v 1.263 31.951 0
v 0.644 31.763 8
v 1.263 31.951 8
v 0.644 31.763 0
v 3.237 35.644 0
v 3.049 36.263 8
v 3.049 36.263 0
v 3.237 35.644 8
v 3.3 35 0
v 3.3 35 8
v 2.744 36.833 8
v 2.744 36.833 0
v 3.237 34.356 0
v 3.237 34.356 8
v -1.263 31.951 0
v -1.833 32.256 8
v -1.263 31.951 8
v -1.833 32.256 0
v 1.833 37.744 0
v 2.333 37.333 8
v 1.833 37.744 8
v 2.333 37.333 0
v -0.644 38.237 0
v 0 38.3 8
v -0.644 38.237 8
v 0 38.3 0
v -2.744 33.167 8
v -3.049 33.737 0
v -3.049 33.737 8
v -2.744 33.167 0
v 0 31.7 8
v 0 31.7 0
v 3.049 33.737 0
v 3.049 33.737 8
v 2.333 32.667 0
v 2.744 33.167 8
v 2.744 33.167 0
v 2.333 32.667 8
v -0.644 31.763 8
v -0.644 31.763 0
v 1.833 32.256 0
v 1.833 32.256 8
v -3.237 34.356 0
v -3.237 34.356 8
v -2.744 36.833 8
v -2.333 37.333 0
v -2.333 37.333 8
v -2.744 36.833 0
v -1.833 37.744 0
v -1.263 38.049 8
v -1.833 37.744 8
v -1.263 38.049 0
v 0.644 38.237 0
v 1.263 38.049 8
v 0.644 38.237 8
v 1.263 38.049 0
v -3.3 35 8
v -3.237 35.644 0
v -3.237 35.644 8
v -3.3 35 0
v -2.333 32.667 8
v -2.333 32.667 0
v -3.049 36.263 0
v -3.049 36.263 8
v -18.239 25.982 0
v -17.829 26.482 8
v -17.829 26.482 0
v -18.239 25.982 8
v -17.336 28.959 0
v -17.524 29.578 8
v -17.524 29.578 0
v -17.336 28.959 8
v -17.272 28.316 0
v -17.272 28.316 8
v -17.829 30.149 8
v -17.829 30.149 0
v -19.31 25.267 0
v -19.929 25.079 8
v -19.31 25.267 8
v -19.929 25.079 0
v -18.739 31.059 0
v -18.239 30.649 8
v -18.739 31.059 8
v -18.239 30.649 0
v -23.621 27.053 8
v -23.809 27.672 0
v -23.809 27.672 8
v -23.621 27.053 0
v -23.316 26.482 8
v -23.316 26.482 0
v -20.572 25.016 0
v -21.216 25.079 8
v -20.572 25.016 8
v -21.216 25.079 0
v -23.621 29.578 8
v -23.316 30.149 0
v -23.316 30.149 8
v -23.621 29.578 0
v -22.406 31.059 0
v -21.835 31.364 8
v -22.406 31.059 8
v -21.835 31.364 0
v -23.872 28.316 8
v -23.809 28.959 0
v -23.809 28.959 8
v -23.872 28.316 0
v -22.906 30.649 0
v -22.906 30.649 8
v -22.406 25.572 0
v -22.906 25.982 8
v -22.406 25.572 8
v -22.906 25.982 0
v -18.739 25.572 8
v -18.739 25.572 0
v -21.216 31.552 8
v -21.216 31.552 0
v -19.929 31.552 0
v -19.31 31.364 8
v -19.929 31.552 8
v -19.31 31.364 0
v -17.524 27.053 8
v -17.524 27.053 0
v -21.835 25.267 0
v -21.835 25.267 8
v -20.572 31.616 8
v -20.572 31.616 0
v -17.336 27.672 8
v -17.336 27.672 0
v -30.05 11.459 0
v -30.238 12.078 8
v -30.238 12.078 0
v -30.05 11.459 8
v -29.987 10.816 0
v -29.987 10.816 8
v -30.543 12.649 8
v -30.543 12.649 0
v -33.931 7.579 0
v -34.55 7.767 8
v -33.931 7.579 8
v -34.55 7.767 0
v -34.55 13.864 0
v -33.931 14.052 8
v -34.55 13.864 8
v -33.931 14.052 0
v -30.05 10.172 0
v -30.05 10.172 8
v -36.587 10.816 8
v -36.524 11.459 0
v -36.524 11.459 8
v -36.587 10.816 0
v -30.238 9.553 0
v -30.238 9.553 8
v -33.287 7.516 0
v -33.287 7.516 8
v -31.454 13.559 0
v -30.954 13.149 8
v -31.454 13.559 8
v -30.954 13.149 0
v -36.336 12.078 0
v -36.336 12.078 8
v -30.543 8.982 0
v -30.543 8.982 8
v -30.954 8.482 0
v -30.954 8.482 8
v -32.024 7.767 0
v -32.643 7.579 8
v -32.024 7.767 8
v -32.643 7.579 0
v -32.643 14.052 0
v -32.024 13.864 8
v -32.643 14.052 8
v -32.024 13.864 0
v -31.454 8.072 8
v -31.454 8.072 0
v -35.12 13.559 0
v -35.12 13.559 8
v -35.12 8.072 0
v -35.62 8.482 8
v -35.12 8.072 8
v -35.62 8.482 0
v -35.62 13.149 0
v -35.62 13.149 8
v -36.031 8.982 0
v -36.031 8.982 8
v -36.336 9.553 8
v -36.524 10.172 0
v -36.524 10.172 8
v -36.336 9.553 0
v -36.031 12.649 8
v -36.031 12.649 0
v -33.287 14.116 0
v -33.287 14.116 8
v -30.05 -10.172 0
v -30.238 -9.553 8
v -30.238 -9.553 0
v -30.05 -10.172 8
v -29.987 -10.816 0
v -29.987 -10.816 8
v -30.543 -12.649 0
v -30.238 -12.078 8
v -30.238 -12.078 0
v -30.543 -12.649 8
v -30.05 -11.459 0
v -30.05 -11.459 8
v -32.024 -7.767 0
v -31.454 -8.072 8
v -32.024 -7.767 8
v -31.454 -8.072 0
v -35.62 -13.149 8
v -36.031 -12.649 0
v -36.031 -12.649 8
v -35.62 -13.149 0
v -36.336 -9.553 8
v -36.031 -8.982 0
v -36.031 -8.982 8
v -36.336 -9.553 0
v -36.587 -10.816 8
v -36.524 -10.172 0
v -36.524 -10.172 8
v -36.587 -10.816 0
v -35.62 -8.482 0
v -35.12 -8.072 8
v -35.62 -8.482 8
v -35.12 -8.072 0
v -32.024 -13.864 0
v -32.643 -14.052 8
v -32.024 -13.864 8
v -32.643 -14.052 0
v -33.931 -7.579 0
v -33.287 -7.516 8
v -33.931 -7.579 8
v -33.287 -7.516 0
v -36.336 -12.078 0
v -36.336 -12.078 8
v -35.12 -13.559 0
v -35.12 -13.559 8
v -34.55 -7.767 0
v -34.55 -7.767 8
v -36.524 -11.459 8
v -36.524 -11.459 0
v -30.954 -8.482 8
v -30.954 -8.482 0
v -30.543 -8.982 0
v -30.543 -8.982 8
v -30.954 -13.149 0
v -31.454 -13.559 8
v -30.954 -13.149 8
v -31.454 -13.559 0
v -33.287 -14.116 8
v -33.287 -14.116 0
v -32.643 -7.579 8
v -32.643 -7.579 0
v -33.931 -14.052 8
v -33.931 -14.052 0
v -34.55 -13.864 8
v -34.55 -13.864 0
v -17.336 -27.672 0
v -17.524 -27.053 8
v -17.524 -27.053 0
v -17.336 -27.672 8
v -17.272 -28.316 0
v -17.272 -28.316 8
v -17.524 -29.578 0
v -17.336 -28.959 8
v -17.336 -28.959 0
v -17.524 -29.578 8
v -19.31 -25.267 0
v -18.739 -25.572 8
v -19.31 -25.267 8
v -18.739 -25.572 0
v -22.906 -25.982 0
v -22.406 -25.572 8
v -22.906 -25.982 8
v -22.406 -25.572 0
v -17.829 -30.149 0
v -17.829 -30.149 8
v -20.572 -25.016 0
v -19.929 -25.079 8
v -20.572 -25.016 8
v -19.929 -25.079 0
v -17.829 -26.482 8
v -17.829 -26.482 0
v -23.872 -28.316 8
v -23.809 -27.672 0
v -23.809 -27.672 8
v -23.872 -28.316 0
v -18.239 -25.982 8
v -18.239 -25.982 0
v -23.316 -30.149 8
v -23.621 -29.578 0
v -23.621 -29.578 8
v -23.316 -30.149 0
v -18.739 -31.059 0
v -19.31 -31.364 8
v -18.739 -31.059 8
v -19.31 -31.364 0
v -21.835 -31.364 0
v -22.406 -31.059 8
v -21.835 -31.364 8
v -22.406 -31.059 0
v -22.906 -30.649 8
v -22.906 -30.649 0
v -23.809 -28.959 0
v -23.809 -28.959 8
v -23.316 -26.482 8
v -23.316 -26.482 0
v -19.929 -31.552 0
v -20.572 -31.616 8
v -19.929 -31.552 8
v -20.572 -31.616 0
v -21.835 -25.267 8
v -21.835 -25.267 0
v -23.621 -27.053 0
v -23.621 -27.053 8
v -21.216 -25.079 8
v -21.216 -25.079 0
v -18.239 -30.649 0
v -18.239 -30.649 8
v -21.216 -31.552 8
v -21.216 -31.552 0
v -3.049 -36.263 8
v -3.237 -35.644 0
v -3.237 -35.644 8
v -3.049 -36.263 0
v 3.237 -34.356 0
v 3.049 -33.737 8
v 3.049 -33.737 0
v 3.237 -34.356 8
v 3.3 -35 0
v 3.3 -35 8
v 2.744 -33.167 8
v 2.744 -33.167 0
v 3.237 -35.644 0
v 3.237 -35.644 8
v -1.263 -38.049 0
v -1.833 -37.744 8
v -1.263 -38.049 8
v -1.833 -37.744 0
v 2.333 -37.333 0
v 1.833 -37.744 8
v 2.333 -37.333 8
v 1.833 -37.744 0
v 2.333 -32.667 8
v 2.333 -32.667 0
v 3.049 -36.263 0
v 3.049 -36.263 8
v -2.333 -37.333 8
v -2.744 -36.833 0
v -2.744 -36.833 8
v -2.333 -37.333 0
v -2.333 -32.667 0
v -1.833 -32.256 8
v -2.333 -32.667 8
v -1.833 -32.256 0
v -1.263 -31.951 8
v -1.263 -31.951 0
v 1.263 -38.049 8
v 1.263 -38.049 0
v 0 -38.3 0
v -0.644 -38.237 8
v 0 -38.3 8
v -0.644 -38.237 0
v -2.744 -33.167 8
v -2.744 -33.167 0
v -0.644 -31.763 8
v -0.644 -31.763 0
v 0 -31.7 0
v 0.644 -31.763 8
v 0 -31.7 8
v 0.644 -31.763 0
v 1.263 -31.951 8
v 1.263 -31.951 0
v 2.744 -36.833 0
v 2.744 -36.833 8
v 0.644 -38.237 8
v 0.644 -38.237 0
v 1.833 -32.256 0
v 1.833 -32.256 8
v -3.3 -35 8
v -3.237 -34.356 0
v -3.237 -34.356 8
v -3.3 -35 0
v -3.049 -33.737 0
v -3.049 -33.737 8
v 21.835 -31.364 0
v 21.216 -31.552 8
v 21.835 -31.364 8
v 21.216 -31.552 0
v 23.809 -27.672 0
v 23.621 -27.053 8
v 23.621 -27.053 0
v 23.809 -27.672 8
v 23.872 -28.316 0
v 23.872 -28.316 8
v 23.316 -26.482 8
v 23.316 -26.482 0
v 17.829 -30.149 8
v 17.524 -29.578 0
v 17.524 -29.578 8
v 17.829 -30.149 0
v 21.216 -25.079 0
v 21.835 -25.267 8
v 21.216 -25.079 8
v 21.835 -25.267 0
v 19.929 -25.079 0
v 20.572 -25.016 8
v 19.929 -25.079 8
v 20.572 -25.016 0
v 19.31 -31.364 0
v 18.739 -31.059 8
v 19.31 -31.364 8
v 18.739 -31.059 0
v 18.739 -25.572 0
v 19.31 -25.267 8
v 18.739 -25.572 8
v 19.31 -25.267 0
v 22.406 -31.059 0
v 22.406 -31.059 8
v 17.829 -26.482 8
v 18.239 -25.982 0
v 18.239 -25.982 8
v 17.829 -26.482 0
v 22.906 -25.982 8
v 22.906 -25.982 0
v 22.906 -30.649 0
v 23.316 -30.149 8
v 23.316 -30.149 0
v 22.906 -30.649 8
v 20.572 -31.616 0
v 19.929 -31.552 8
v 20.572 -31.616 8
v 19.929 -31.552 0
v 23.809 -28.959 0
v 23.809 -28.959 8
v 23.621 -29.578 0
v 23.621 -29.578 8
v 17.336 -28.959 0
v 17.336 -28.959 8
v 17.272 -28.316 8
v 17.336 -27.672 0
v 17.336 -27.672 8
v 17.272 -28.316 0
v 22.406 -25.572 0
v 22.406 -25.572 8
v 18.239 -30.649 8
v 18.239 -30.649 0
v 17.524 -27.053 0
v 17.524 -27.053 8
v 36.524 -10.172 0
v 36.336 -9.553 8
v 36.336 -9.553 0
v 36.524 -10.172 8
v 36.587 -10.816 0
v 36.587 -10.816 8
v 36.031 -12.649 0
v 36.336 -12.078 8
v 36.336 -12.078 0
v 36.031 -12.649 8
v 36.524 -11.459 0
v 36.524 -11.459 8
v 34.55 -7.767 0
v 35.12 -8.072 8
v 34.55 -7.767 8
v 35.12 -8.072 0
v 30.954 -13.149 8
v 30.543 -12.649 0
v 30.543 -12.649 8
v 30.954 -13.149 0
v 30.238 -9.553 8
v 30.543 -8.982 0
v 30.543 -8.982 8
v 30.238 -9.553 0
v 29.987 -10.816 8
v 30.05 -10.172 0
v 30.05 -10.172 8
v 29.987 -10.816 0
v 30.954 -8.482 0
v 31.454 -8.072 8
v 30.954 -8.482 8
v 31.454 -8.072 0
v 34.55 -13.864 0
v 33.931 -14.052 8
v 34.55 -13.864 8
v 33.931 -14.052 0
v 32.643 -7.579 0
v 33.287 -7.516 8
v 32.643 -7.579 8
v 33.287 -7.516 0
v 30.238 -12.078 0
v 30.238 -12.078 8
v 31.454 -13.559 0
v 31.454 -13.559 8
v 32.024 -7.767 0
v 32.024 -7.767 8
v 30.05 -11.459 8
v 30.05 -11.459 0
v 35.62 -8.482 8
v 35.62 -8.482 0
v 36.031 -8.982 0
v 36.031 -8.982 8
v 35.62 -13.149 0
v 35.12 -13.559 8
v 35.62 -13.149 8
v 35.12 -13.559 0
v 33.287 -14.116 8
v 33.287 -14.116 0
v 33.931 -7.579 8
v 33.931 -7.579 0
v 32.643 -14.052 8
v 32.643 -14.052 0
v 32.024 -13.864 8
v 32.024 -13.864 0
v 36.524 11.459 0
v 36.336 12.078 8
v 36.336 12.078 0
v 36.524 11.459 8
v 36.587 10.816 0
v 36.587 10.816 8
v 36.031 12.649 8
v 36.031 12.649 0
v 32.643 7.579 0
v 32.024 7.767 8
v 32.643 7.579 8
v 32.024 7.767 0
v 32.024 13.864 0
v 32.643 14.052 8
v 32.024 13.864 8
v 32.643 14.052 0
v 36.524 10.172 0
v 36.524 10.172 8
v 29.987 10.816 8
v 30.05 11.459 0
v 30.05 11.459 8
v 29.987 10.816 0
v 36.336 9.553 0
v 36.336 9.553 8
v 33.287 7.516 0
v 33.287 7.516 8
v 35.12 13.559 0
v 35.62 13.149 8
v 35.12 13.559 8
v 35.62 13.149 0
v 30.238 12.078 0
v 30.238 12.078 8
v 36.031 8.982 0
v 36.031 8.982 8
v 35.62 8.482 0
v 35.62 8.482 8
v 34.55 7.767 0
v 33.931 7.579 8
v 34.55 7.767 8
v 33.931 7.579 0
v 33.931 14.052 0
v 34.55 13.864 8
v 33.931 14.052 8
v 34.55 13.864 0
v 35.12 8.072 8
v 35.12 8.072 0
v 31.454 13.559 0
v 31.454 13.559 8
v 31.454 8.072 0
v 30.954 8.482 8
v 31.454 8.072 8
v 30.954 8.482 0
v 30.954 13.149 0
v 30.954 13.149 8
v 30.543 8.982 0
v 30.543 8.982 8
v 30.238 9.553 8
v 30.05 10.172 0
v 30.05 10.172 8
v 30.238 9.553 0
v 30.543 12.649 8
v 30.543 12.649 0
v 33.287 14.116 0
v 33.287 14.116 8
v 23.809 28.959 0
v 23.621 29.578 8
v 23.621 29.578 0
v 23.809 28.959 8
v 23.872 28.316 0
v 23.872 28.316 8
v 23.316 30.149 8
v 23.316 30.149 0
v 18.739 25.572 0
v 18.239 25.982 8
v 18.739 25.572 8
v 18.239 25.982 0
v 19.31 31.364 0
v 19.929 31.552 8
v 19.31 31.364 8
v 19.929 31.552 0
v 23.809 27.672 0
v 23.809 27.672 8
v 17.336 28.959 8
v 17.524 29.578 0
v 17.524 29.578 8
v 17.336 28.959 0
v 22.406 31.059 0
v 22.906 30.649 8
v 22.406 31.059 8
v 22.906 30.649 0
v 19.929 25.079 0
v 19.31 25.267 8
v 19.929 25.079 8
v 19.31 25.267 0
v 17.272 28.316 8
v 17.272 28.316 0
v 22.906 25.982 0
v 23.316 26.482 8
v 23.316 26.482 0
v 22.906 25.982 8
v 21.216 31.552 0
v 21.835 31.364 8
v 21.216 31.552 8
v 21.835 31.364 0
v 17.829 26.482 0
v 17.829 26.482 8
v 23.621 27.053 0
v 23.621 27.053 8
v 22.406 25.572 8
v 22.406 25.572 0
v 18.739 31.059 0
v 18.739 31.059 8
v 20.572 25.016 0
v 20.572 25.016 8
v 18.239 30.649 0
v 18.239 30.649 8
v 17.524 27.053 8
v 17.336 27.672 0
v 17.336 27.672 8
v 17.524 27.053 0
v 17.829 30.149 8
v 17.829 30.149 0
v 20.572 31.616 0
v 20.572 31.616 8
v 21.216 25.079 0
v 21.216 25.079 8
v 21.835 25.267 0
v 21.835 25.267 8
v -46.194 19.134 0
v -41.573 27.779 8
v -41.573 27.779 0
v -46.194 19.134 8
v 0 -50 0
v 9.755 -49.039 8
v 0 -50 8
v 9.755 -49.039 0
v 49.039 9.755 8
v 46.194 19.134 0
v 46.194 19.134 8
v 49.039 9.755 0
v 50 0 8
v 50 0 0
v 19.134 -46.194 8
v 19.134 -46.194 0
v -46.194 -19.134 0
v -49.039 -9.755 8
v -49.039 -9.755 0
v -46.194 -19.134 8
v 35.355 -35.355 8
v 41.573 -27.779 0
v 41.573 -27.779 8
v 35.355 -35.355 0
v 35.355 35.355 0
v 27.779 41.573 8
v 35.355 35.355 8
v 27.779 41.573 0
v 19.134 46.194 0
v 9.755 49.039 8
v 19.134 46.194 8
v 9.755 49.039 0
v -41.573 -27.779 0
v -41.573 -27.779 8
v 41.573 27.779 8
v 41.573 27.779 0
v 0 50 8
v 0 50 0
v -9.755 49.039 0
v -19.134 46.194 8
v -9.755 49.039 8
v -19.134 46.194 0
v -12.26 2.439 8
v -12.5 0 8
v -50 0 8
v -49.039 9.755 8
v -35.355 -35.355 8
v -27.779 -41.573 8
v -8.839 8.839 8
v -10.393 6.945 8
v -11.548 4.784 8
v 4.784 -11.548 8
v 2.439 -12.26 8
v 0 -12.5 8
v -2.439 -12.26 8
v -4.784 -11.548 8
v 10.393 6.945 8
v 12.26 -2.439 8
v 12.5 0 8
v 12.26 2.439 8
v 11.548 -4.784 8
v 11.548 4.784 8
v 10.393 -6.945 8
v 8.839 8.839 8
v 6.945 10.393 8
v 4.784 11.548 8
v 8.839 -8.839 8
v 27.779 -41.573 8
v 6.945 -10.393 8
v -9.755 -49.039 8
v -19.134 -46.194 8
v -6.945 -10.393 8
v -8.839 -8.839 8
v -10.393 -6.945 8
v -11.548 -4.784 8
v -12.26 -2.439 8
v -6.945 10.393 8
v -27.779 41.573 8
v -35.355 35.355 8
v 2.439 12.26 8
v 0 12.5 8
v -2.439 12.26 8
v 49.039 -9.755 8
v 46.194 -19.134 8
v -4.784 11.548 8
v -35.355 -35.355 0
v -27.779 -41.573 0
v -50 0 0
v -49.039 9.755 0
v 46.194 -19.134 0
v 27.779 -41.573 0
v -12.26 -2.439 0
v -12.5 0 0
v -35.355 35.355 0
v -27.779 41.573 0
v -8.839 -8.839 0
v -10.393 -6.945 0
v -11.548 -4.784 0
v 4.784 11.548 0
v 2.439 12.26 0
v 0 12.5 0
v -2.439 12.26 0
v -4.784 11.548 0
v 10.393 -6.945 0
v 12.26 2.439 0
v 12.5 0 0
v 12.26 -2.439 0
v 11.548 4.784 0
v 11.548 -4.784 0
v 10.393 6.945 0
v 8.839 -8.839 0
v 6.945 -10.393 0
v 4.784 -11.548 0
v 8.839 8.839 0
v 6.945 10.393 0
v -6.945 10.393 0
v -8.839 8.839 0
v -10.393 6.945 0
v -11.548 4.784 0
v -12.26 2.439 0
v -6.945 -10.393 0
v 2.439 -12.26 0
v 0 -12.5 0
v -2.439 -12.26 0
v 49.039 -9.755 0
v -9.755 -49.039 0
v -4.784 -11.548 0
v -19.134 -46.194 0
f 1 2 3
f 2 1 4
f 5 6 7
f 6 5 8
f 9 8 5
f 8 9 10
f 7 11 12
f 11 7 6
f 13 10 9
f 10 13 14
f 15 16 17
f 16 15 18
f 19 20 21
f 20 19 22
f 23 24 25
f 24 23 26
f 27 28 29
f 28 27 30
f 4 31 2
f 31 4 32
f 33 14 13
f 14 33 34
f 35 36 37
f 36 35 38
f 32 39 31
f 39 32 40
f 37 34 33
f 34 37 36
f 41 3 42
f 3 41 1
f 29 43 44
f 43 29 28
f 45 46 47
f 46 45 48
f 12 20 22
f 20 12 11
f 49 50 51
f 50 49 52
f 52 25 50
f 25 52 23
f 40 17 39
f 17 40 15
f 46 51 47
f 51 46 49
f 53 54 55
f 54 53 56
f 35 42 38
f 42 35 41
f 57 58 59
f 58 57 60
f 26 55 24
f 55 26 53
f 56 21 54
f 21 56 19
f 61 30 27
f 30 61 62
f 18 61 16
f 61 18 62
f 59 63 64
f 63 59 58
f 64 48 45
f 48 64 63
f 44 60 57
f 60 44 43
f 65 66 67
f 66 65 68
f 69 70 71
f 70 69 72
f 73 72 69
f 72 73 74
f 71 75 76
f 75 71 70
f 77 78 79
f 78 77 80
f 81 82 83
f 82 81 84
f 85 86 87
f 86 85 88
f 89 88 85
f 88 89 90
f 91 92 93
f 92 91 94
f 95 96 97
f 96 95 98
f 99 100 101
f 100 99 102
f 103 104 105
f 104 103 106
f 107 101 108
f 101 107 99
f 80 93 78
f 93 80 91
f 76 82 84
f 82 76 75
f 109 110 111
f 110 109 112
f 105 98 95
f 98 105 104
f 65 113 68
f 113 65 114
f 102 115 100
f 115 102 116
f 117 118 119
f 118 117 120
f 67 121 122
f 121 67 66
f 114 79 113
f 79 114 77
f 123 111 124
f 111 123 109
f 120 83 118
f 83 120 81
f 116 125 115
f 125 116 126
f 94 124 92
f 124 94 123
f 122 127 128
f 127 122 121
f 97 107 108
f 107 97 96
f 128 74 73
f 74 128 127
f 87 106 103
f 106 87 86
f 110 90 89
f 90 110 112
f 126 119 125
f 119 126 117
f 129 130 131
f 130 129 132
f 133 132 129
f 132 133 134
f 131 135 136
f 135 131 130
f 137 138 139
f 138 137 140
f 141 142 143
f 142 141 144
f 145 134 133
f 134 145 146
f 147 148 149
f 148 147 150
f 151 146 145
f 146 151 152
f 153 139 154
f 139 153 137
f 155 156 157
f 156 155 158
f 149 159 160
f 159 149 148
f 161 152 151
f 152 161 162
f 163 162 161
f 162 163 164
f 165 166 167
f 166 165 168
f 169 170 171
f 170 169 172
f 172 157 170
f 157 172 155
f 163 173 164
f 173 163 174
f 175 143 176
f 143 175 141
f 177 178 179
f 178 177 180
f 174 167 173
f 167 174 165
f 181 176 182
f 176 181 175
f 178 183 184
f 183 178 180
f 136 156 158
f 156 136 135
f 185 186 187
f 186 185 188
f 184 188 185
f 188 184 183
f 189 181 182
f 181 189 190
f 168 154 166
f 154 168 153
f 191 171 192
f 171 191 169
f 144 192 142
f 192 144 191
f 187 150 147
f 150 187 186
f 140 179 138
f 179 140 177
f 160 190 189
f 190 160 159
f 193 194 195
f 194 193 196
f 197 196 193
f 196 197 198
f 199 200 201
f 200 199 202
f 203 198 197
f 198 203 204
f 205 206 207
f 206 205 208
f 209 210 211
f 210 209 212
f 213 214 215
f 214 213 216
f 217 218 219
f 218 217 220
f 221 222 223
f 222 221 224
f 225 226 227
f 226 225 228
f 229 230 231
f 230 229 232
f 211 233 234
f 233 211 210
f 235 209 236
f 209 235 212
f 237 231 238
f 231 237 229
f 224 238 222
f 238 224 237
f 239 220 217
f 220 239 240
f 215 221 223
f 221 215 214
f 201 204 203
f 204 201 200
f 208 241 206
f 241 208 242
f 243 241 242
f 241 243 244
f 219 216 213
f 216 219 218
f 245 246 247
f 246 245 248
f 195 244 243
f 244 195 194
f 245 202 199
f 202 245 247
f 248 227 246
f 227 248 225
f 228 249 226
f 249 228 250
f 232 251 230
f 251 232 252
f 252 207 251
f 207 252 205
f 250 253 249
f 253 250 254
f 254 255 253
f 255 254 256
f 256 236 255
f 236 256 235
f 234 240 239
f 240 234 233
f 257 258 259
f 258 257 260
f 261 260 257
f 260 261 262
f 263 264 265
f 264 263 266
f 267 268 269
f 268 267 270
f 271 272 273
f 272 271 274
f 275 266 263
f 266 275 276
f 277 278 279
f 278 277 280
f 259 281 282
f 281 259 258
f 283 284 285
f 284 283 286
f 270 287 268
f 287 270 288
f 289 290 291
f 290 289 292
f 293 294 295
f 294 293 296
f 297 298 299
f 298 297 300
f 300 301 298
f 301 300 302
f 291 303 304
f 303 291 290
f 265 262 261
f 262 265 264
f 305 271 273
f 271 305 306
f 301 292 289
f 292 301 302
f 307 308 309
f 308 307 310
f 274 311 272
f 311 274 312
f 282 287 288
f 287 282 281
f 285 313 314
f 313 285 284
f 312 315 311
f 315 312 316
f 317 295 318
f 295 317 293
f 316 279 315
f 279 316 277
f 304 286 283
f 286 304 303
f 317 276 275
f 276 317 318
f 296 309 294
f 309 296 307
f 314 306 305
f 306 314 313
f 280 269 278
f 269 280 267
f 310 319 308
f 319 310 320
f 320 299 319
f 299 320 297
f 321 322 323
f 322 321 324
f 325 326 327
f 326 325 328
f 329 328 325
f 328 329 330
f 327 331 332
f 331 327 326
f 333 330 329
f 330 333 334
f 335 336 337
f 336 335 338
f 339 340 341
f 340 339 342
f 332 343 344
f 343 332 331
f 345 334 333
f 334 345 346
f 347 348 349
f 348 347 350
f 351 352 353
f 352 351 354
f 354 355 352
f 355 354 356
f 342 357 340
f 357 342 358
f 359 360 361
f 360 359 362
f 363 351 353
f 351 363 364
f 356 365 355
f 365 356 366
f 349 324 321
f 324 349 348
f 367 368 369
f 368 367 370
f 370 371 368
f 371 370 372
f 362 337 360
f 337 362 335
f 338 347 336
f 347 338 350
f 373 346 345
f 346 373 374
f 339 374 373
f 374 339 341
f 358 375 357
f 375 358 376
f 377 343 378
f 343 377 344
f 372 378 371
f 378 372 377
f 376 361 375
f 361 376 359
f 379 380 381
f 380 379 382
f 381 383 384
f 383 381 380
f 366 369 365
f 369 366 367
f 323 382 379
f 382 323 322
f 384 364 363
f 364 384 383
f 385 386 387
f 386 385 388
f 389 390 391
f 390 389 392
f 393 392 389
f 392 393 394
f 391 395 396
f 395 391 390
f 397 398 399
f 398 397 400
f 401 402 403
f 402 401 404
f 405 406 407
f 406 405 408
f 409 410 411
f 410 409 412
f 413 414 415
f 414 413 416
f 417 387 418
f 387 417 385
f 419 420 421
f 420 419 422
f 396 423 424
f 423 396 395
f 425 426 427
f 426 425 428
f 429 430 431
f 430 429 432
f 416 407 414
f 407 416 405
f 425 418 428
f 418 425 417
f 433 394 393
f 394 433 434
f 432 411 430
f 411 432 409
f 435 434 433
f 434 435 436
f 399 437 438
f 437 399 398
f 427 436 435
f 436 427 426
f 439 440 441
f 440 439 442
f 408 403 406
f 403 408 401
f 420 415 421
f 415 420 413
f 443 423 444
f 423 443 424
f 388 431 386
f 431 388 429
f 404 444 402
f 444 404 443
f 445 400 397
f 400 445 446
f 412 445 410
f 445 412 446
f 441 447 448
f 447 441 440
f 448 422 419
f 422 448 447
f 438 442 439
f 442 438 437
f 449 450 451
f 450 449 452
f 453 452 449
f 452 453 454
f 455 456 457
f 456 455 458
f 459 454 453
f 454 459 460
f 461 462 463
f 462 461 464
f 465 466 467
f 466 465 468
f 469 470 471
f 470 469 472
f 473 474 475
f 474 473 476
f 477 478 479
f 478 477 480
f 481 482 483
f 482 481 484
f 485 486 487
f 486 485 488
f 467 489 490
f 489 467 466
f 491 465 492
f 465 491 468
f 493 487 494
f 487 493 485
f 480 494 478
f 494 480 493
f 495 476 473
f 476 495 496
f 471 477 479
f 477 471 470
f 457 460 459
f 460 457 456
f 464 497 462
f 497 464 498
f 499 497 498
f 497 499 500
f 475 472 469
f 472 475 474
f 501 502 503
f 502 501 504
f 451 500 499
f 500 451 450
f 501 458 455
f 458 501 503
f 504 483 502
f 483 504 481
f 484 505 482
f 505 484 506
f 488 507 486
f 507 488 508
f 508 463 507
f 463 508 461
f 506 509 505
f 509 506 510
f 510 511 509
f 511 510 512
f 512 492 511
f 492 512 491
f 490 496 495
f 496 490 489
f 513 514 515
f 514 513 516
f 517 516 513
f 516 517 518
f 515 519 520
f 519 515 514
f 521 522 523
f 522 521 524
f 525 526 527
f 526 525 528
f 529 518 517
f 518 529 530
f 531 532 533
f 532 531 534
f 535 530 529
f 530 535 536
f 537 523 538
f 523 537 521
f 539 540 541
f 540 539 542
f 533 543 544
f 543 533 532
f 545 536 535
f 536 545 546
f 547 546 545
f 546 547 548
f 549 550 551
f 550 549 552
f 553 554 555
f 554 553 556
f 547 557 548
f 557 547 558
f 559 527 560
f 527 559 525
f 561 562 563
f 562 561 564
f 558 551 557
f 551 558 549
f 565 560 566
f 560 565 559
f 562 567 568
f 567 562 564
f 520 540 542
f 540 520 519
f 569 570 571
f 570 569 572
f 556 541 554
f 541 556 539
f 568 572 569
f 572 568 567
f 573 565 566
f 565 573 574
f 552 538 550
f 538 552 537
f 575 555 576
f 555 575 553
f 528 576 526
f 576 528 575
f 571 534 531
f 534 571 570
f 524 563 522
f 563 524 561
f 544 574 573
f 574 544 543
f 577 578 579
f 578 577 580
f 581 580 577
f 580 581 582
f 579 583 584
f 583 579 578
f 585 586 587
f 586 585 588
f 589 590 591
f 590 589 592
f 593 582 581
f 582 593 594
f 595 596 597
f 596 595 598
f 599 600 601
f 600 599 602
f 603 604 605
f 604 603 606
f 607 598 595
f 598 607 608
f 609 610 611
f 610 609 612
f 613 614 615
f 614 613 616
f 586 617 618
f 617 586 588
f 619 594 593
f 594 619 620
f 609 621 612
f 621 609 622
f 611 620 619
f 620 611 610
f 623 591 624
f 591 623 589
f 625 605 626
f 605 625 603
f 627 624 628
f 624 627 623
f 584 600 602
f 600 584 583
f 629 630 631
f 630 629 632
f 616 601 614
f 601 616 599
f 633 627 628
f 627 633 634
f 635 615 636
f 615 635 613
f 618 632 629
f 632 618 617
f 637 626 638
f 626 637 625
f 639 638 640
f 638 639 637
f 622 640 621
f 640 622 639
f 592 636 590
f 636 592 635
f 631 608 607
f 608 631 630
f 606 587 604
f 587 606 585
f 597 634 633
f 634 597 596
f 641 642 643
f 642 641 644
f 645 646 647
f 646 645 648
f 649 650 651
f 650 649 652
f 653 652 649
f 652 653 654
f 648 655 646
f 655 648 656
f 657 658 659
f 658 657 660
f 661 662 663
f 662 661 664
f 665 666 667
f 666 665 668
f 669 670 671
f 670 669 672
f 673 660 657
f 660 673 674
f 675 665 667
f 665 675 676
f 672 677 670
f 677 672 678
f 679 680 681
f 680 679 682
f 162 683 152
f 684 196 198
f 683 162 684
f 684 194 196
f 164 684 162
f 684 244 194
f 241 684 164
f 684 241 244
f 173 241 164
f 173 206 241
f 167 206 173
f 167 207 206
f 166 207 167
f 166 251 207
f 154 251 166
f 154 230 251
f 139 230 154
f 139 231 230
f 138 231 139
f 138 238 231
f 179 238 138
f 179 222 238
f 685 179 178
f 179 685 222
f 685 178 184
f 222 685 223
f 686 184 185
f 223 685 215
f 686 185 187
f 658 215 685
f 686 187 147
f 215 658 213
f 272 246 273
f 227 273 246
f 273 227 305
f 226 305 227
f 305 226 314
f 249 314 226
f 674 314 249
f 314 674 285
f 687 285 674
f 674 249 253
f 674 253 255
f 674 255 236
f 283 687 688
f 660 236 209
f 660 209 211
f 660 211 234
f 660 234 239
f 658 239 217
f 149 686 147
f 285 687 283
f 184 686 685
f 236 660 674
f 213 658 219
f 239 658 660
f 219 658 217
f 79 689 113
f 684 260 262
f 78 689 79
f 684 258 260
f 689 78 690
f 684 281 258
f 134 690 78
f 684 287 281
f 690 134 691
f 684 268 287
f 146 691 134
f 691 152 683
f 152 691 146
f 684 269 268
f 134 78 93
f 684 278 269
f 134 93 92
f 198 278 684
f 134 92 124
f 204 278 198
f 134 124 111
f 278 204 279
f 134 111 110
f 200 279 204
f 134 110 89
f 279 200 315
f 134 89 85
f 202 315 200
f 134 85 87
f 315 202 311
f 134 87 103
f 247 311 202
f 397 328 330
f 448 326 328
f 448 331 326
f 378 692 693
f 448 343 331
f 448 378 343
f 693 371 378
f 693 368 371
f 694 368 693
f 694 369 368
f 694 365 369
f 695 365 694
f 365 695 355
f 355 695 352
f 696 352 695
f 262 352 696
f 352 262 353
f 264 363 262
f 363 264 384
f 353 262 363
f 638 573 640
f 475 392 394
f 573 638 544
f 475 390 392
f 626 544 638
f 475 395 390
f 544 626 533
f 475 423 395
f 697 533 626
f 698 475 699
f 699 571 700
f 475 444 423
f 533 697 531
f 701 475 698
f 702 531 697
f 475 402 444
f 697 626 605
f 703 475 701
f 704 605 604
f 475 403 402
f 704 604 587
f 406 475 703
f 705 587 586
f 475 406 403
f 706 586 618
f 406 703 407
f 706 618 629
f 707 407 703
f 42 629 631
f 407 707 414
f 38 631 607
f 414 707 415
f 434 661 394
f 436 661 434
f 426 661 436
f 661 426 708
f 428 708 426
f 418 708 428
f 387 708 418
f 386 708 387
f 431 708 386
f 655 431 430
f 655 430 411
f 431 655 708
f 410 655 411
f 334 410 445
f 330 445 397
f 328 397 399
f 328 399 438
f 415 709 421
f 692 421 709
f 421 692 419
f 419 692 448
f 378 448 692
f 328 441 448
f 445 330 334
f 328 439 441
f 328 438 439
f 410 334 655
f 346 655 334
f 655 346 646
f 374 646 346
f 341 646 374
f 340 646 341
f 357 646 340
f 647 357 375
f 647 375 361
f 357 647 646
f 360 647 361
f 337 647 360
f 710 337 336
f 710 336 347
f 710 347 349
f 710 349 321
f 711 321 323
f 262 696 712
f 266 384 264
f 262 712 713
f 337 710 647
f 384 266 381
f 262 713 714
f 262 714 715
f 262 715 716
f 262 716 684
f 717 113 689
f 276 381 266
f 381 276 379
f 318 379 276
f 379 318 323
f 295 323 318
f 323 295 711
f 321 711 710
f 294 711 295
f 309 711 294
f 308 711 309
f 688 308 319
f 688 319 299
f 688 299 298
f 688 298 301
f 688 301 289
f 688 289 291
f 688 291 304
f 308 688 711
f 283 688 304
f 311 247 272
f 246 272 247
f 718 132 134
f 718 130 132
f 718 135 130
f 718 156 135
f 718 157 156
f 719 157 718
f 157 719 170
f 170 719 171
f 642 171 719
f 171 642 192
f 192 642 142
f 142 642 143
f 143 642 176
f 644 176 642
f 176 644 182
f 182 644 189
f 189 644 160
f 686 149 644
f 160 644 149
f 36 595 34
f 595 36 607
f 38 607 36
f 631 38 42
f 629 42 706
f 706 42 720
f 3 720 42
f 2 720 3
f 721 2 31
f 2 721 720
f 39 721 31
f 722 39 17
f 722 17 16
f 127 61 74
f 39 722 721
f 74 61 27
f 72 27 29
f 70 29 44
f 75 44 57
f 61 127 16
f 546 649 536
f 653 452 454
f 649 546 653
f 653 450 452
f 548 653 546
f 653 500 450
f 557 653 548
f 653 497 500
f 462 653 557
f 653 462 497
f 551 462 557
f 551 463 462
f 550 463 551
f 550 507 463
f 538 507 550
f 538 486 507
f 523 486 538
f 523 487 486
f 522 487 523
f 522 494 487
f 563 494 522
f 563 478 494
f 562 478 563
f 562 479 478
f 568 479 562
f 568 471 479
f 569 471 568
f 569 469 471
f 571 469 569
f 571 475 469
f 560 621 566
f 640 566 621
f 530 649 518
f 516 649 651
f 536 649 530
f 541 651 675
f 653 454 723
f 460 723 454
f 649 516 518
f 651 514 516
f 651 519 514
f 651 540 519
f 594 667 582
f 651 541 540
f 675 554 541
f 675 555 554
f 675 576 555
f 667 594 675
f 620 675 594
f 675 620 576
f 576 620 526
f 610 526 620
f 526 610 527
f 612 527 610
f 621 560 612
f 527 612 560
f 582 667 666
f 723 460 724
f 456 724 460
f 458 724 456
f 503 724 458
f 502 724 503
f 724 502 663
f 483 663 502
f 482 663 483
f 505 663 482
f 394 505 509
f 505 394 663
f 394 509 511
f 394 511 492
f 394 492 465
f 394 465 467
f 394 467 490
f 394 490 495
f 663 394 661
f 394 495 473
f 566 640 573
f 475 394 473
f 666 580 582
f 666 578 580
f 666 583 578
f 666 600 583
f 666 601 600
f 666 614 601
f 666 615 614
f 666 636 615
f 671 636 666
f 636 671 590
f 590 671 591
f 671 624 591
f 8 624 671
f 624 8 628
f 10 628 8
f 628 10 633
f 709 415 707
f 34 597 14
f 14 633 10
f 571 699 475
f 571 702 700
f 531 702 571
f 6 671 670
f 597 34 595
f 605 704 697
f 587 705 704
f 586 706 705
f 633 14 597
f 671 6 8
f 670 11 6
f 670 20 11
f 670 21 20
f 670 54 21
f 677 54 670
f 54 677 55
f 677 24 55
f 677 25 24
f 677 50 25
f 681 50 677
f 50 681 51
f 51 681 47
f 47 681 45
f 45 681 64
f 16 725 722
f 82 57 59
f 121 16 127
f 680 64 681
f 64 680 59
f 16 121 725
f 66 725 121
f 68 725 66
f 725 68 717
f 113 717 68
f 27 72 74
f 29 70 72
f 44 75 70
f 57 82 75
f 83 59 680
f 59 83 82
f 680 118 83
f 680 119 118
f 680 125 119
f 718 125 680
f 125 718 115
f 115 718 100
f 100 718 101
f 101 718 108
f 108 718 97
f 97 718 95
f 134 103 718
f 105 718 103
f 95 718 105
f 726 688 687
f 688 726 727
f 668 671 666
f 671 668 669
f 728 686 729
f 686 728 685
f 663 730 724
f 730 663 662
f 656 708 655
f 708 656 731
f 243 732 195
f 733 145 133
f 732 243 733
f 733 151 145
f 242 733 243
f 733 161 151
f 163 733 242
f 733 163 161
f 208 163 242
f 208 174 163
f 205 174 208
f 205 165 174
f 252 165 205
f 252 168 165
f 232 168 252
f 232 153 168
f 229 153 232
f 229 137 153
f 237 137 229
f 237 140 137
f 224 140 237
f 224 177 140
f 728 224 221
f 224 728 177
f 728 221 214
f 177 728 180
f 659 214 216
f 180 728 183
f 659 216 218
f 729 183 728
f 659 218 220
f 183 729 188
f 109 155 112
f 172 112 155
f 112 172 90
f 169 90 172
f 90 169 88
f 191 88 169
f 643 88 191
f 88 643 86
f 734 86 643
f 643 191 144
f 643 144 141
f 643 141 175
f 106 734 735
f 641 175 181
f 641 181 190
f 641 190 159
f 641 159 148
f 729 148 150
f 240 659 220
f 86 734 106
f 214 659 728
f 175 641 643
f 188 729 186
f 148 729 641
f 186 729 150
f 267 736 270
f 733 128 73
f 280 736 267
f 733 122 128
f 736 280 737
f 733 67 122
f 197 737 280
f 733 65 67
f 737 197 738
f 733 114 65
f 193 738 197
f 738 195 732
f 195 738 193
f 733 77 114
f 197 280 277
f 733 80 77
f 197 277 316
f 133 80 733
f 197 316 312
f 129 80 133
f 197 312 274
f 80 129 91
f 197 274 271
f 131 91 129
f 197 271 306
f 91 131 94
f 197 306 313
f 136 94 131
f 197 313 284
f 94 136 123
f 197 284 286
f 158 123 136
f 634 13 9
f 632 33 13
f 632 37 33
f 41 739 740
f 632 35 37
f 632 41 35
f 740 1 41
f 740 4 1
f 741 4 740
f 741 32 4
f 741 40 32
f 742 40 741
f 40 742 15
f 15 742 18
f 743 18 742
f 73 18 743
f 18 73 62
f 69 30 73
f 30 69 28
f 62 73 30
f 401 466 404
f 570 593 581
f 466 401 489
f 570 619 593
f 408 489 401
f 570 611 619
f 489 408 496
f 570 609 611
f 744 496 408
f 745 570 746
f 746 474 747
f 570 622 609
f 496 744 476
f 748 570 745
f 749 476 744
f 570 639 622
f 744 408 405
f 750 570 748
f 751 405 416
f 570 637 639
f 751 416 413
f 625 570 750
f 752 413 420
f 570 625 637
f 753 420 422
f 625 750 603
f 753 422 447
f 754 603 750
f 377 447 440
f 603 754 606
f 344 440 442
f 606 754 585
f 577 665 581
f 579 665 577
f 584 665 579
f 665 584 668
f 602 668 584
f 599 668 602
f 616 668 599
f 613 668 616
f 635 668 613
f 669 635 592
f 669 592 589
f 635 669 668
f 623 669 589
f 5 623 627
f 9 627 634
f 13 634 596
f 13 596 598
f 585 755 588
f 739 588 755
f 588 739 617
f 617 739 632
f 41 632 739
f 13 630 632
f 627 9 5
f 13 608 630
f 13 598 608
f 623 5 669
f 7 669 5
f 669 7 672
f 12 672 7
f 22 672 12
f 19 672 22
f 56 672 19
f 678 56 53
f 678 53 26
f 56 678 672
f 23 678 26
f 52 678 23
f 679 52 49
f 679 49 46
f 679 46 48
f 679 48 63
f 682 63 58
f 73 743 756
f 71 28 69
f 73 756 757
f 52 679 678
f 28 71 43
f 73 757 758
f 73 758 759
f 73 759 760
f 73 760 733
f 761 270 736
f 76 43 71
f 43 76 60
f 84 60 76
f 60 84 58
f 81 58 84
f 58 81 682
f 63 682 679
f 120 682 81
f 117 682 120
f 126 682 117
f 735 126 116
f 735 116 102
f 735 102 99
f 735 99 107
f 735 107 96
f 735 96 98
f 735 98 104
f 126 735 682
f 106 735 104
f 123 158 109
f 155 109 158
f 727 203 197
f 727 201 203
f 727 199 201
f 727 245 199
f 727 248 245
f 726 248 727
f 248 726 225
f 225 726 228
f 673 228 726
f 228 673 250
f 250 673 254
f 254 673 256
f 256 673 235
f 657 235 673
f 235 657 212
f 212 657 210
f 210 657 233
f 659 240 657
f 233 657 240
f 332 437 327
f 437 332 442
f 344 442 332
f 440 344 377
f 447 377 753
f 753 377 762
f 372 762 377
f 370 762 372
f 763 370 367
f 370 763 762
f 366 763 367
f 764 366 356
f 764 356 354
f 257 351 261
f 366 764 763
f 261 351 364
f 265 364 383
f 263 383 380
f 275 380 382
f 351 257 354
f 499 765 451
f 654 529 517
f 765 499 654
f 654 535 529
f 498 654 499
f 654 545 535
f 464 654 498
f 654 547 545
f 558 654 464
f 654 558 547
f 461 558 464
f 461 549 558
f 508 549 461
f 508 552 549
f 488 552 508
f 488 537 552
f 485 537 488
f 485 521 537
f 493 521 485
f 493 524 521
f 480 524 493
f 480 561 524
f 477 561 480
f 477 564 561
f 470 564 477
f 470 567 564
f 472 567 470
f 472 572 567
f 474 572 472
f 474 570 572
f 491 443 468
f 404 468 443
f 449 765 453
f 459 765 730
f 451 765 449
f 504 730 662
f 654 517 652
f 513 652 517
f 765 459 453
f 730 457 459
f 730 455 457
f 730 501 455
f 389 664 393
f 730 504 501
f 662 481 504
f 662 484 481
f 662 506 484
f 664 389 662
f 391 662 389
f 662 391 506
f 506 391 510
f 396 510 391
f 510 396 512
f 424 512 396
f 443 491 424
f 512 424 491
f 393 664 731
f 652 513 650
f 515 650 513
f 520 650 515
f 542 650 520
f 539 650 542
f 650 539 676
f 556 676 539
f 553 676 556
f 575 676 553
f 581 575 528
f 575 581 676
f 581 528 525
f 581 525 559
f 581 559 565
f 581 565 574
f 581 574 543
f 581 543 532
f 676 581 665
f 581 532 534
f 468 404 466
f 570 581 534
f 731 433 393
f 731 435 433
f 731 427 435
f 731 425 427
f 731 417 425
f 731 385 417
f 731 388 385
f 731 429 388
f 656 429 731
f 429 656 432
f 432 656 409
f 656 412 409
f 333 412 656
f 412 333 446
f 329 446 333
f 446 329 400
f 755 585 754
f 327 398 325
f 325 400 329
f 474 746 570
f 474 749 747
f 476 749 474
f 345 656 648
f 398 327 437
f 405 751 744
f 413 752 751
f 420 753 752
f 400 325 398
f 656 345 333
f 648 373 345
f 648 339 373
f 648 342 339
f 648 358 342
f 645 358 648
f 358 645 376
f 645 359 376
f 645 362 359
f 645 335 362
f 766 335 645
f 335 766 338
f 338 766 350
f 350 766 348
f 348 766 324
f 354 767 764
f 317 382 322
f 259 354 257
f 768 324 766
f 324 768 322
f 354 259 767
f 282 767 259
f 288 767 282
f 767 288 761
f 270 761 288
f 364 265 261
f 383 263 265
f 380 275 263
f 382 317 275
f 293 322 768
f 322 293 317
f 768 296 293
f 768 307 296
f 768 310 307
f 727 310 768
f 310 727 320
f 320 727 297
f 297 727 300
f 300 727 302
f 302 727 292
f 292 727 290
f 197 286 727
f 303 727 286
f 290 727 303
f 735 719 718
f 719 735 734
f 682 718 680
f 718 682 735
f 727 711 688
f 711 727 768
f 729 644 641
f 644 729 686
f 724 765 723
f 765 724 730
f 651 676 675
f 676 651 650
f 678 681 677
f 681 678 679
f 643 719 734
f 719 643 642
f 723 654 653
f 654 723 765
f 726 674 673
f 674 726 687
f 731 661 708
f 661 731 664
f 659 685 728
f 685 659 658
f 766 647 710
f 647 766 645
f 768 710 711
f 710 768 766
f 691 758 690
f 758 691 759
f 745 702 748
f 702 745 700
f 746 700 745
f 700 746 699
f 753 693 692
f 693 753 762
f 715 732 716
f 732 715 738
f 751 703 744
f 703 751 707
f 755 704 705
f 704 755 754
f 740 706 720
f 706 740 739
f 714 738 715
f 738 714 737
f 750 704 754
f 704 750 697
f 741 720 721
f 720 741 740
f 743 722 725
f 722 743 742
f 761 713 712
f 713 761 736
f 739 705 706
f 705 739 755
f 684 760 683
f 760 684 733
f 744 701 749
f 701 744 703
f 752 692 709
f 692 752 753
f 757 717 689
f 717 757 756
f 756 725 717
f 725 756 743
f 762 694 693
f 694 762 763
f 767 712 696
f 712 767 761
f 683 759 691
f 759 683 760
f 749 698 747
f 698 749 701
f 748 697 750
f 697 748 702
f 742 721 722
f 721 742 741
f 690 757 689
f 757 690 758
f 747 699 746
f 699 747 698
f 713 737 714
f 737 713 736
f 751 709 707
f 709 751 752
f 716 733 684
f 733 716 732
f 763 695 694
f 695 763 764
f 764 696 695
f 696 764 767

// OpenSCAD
$fn = 32;

// ----------------------------------------------------------------------
// Flange Ø100 x 8
// 10 holes on a Ø70 bolt circle, bolted joints
// ----------------------------------------------------------------------

// --- parameters (mm) ---
flange_d = 100;  // outside diameter of the flange
thickness = 8;   // flange thickness
holes = 10;      // number of bolt holes
pcd = 70;        // bolt circle diameter
start_deg = 90;  // angle of the first hole, from +X
hole_d = 6.6;    // bolt hole diameter
bore_d = 25;     // central through bore
hub_d = 37;      // hub outside diameter
hub_h = 0;       // hub height above the flange face (0 = no hub)

// --- derived feature positions (mm) ---
height = thickness + hub_h;  // = 8   overall height of the part
pcd_r = pcd / 2;             // = 35   bolt circle radius
hole_step = 360 / holes;     // = 36   angular pitch
feature_centers = [
  [pcd_r * cos(start_deg + 0 * hole_step), pcd_r * sin(start_deg + 0 * hole_step)],
  [pcd_r * cos(start_deg + 1 * hole_step), pcd_r * sin(start_deg + 1 * hole_step)],
  [pcd_r * cos(start_deg + 2 * hole_step), pcd_r * sin(start_deg + 2 * hole_step)],
  [pcd_r * cos(start_deg + 3 * hole_step), pcd_r * sin(start_deg + 3 * hole_step)],
  [pcd_r * cos(start_deg + 4 * hole_step), pcd_r * sin(start_deg + 4 * hole_step)],
  [pcd_r * cos(start_deg + 5 * hole_step), pcd_r * sin(start_deg + 5 * hole_step)],
  [pcd_r * cos(start_deg + 6 * hole_step), pcd_r * sin(start_deg + 6 * hole_step)],
  [pcd_r * cos(start_deg + 7 * hole_step), pcd_r * sin(start_deg + 7 * hole_step)],
  [pcd_r * cos(start_deg + 8 * hole_step), pcd_r * sin(start_deg + 8 * hole_step)],
  [pcd_r * cos(start_deg + 9 * hole_step), pcd_r * sin(start_deg + 9 * hole_step)]
];   // bolt hole centres on the pitch circle

// flange disc, every hole and the bore cut straight through
difference() {
  union() {
    cylinder(d = flange_d, h = thickness);
  }
  translate([0, 0, -1]) cylinder(d = bore_d, h = height + 2);  // bore, through
  for (centre = feature_centers)
    translate([centre[0], centre[1], -1]) cylinder(d = hole_d, h = thickness + 2);
}
